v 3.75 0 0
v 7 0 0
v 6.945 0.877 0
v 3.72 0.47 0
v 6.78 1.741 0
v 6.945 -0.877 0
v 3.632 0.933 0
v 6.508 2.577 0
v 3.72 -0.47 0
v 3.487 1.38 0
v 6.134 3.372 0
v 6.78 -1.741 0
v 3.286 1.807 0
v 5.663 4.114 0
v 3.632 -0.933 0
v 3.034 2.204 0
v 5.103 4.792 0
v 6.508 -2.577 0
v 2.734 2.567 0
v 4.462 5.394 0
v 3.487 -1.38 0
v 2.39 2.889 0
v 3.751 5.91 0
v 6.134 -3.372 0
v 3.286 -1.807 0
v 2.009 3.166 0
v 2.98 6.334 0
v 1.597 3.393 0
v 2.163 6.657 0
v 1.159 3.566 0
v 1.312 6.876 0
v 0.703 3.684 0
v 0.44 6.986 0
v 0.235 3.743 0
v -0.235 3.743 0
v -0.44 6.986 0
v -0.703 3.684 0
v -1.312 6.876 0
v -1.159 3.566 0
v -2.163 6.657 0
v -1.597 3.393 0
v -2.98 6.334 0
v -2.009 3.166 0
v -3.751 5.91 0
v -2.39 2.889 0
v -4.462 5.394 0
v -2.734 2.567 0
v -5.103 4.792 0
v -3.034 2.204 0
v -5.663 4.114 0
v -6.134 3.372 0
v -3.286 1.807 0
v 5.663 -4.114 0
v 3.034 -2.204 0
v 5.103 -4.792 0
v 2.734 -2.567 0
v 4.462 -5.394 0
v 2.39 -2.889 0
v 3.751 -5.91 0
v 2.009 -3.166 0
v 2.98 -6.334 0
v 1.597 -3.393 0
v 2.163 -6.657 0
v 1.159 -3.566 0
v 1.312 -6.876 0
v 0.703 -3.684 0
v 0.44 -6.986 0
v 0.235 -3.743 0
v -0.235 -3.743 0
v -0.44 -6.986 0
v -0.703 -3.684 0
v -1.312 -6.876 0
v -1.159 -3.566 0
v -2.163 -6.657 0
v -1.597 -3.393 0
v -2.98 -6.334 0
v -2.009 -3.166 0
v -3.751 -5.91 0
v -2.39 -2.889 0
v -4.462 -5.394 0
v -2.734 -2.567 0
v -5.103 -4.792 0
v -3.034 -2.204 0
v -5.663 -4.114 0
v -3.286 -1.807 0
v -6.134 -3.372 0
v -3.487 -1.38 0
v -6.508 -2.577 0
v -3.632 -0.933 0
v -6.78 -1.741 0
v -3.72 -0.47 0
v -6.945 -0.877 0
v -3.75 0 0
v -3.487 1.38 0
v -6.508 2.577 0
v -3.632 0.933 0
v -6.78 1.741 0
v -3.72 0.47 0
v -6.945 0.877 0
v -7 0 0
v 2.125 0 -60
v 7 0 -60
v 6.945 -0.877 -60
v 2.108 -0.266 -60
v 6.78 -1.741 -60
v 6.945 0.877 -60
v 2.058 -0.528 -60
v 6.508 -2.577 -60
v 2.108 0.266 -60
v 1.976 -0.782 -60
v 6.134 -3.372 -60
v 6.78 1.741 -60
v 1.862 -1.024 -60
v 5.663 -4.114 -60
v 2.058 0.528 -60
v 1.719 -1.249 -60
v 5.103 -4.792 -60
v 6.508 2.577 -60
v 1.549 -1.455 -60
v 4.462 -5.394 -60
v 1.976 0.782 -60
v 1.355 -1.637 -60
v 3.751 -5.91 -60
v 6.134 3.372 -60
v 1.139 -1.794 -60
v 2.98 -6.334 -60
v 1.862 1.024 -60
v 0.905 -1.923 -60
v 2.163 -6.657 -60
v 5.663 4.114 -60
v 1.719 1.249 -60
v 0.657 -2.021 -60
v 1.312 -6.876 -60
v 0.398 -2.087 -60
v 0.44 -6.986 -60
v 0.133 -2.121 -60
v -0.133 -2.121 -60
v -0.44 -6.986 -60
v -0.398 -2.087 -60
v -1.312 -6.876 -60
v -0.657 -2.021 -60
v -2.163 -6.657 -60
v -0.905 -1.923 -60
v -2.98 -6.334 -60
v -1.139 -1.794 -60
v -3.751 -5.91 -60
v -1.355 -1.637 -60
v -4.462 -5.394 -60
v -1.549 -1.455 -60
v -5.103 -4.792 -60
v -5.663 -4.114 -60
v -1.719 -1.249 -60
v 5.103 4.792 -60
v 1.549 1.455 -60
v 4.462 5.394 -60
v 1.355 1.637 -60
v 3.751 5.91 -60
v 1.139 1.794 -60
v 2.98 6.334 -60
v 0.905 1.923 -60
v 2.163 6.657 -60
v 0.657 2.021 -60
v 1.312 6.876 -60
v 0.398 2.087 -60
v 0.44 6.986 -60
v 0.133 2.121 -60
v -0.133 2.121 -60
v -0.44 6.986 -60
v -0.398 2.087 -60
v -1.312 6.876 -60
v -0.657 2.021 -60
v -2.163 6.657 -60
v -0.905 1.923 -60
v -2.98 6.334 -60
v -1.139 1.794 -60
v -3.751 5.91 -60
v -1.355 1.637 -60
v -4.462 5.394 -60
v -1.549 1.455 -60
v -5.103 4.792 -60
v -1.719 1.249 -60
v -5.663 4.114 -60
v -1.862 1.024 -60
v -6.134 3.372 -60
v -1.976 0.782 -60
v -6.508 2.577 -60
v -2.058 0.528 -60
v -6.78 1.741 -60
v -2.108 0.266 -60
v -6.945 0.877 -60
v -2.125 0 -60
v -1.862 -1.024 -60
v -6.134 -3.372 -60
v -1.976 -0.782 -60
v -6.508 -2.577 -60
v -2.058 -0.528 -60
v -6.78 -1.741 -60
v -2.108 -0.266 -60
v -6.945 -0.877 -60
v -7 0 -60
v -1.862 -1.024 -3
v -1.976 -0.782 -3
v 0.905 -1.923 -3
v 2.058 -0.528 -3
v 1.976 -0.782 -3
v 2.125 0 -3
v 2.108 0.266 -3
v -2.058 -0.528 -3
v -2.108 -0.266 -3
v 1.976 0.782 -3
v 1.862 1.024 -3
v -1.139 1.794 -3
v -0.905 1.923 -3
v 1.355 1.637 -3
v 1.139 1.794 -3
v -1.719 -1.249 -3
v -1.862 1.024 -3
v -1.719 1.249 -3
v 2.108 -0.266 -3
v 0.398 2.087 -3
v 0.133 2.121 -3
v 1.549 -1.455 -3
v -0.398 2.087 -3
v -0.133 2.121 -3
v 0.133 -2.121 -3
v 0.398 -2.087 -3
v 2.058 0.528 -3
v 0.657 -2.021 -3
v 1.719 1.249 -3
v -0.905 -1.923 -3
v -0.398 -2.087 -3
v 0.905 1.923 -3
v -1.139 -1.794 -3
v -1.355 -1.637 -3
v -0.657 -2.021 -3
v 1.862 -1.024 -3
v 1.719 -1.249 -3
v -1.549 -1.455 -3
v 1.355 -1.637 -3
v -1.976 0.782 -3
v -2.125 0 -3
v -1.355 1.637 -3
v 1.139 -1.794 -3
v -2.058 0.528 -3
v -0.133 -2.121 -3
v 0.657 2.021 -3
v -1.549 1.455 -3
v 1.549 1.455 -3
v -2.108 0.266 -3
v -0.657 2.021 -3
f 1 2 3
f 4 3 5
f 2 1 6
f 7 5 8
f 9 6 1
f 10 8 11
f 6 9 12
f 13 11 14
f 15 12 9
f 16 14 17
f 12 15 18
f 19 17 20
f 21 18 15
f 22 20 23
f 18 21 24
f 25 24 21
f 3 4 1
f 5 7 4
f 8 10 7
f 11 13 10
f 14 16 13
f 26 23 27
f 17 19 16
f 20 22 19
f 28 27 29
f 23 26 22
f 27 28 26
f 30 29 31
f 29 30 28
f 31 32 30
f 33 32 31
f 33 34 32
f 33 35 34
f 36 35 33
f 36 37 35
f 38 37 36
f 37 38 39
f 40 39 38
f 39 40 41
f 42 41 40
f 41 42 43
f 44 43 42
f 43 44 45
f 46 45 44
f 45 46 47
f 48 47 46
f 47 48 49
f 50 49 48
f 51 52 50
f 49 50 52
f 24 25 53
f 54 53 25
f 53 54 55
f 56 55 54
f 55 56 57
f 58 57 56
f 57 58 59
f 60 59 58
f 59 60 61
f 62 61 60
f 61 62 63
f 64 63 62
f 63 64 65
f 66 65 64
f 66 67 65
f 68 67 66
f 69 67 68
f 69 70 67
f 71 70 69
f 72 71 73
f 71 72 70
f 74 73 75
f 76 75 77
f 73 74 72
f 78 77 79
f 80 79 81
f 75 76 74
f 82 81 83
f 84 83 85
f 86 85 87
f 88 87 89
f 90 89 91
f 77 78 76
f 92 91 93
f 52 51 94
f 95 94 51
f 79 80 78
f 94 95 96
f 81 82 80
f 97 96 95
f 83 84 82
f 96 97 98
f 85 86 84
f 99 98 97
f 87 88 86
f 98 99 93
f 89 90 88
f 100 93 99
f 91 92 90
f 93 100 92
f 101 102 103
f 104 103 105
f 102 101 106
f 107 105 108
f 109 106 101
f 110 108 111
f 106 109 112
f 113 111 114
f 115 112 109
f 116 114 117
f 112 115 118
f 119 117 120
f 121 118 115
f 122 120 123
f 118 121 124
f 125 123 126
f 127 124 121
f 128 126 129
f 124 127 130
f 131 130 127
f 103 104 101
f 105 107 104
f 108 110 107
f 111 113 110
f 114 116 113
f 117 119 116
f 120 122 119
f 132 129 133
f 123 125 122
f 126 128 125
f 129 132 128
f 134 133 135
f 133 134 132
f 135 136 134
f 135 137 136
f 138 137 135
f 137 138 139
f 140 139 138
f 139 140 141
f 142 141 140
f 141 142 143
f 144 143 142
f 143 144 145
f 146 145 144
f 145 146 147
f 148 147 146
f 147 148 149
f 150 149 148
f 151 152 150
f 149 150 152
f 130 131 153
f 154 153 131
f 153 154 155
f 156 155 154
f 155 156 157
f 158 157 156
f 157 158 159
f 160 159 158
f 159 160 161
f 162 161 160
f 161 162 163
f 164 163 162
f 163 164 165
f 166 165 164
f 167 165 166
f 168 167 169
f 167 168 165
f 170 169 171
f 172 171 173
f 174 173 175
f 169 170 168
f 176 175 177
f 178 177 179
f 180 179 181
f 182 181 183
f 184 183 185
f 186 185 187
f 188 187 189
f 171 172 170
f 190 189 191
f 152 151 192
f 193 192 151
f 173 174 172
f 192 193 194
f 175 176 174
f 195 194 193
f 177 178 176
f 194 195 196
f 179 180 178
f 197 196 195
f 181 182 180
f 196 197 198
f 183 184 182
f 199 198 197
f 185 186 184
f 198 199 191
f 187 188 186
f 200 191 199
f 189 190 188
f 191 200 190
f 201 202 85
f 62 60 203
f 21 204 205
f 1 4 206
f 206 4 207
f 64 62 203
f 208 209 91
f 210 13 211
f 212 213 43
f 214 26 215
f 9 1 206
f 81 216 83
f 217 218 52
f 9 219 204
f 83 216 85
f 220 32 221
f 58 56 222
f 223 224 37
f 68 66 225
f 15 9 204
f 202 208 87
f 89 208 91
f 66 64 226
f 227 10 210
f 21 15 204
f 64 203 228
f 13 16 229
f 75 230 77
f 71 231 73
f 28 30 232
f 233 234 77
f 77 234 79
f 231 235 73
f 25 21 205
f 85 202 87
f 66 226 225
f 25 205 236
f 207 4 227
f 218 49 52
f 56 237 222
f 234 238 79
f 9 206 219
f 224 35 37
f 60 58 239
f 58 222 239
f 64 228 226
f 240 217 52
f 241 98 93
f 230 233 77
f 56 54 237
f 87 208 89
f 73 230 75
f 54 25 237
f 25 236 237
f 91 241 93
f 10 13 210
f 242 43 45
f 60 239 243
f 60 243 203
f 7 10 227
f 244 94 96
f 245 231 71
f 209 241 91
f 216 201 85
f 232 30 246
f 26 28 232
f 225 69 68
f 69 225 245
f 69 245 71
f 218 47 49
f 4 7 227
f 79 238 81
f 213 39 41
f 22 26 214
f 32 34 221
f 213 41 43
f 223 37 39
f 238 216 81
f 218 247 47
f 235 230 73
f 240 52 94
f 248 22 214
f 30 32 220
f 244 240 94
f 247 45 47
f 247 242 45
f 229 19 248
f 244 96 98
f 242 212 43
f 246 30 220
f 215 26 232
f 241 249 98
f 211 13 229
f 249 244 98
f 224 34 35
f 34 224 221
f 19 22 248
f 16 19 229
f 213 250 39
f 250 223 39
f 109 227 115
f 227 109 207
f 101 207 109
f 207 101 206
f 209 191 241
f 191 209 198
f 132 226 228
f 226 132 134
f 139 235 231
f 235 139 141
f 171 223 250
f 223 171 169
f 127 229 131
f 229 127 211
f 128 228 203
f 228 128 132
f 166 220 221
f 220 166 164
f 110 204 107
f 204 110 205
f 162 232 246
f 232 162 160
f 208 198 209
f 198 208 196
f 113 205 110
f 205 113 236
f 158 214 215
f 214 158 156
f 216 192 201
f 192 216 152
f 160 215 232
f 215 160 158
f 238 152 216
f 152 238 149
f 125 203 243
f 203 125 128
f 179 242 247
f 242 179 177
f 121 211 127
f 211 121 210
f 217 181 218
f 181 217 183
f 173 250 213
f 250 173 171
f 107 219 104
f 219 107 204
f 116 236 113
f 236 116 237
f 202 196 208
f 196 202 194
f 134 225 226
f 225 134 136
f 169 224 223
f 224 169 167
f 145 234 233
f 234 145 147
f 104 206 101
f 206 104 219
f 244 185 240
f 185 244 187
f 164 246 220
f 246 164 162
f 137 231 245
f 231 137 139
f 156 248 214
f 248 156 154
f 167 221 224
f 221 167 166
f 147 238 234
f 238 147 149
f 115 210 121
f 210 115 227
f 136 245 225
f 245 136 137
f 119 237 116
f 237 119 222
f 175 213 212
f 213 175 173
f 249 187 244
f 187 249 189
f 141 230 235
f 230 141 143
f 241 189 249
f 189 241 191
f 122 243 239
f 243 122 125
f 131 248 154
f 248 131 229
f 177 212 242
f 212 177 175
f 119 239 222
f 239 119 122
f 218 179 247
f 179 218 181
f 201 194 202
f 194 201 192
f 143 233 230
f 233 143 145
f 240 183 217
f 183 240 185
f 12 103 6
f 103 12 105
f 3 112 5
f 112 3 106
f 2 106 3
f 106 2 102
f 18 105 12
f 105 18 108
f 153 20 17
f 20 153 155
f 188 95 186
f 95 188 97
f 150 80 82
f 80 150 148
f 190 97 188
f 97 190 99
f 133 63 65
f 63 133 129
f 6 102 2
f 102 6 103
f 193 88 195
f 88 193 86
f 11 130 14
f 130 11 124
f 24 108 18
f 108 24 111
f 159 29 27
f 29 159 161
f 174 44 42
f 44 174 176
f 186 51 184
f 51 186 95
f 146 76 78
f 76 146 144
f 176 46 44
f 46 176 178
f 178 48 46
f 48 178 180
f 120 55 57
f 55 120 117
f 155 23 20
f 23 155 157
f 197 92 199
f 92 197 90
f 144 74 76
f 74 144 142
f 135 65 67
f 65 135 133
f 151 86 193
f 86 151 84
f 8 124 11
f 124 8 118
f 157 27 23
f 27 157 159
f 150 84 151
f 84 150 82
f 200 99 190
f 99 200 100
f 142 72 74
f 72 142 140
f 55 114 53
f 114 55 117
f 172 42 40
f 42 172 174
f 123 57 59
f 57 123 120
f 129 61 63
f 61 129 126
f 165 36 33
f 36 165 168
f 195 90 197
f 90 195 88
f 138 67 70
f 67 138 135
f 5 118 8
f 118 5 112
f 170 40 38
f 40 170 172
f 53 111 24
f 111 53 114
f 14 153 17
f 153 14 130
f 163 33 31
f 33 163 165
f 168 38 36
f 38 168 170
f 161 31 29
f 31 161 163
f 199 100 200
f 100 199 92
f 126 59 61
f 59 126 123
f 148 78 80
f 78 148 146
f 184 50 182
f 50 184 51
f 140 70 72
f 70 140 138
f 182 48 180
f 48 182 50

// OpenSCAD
$fn = 50;


difference() {
	union() {
		translate(v = [0, 0, -60.0000000000]) {
			cylinder(h = 60, r = 7.0000000000);
		}
	}
	union() {
		translate(v = [0, 0, 0]) {
			rotate(a = [0, 0, 0]) {
				difference() {
					union() {
						#translate(v = [0, 0, -60.0000000000]) {
							cylinder(h = 60, r = 2.0000000000);
						}
						#translate(v = [0, 0, -3]) {
							cylinder(h = 3, r = 7.0000000000, r1 = 2.1250000000, r2 = 3.7500000000);
						}
						#translate(v = [0, 0, -60.0000000000]) {
							cylinder(h = 60, r = 2.1250000000);
						}
						#translate(v = [0, 0, -60.0000000000]) {
							cylinder(h = 60, r = 2.0000000000);
						}
					}
					union();
				}
			}
		}
	}
}
